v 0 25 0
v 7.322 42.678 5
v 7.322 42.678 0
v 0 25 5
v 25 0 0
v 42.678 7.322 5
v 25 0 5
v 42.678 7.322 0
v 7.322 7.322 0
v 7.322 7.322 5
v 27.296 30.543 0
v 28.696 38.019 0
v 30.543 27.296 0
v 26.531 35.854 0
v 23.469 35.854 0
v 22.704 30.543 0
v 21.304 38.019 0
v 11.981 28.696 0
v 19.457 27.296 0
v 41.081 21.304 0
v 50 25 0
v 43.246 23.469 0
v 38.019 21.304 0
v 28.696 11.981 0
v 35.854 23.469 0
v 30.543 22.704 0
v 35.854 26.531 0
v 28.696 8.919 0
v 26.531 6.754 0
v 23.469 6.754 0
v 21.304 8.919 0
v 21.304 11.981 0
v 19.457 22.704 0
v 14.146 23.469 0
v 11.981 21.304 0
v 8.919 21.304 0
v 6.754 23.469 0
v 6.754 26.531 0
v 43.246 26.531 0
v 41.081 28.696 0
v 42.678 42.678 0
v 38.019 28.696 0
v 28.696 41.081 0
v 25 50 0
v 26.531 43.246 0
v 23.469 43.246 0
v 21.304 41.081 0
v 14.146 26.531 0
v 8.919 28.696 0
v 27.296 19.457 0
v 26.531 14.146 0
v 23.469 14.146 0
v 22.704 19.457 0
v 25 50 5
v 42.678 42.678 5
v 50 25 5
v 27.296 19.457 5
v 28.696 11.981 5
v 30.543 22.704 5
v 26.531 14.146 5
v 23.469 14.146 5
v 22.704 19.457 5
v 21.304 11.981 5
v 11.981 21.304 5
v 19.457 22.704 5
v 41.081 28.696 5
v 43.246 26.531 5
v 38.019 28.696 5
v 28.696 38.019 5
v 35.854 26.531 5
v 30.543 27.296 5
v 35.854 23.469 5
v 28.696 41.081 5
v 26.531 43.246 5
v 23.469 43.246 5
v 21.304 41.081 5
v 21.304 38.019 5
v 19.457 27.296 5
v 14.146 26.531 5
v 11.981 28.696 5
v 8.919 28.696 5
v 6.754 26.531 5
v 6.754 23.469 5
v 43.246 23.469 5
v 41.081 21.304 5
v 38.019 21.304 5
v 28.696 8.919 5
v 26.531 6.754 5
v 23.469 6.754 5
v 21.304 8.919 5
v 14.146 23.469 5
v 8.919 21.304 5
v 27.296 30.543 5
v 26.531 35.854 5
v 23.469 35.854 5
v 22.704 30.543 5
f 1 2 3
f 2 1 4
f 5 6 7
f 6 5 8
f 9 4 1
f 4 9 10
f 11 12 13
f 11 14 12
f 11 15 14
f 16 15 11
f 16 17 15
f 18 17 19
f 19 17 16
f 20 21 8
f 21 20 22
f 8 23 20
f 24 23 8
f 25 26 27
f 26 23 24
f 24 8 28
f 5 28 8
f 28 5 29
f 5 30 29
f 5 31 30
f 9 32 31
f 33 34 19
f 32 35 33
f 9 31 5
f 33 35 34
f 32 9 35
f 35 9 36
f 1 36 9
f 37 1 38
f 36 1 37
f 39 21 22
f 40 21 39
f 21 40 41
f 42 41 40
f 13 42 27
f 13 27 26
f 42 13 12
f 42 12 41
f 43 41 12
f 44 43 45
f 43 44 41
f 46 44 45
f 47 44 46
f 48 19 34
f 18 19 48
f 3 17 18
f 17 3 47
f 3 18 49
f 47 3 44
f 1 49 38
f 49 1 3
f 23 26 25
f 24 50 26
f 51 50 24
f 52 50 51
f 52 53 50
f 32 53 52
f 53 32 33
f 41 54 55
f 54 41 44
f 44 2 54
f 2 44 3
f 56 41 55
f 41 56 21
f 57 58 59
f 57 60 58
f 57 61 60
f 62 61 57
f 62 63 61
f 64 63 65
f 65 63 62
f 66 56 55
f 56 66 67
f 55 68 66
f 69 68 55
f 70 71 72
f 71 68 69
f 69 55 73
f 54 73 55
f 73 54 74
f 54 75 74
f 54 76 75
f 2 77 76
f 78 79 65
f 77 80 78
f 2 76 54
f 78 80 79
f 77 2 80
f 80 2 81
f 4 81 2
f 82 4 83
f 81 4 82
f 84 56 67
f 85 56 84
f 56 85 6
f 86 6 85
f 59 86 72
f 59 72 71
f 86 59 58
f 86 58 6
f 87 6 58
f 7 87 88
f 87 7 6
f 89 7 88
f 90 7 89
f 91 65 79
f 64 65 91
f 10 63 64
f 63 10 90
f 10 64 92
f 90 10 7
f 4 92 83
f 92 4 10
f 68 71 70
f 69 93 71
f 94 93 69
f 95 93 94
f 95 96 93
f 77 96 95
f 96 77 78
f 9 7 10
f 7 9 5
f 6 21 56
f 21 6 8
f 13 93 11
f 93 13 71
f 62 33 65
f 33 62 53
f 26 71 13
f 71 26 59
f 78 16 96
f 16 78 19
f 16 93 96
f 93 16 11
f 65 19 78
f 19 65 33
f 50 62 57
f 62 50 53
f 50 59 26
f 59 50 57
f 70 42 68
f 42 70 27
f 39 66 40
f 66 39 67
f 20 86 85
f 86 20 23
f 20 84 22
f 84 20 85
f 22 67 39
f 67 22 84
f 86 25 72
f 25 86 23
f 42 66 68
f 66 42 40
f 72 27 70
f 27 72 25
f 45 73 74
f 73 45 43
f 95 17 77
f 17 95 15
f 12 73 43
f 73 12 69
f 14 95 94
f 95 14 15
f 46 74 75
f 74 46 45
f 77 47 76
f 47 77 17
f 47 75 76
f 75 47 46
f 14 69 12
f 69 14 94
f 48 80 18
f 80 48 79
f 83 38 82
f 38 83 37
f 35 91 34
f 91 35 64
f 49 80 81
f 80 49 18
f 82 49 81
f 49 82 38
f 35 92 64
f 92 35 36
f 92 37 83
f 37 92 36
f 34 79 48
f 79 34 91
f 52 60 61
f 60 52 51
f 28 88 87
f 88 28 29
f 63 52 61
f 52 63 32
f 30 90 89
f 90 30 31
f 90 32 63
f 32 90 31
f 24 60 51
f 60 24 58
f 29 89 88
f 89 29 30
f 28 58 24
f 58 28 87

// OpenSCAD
$fn = 32;

// ----------------------------------------------------------------------
// Polygon plate: 8-gon R25, 4 bolt windows
// ----------------------------------------------------------------------

// --- parameters (mm) ---
sides = 8;                // number of polygon sides
plate_r = 25;             // circumscribed radius of the polygon
bore_r = 6;               // centre bore radius
bolts = 4;                // number of bolt windows
ring_r = 14.55;           // bolt-circle radius
bolt_r = 4;               // bolt window radius
plate_t = 5;              // plate thickness, Z (extrusion height)
fit_tol = 0.05;           // declared fit tolerance (prompt contract)
free_tol = 0.2;           // declared free tolerance (prompt contract)

plate_d = 2 * plate_r;  // circumscribed diameter
bore_d = 2 * bore_r;  // centre bore diameter
bolt_d = 2 * bolt_r;  // bolt window diameter
ring_d = 2 * ring_r;  // bolt-circle diameter

profile = [[50, 25], [42.678, 42.678], [25, 50], [7.322, 42.678], [0, 25], [7.322, 7.322], [25, 0], [42.678, 7.322]];  // primary outline, 8 points, counter clockwise
void_1 = [[30.543, 27.296], [27.296, 30.543], [22.704, 30.543], [19.457, 27.296], [19.457, 22.704], [22.704, 19.457], [27.296, 19.457], [30.543, 22.704]];  // centre bore, 8 points
void_2 = [[43.246, 26.531], [41.081, 28.696], [38.019, 28.696], [35.854, 26.531], [35.854, 23.469], [38.019, 21.304], [41.081, 21.304], [43.246, 23.469]];  // bolt window 1, 8 points
void_3 = [[28.696, 41.081], [26.531, 43.246], [23.469, 43.246], [21.304, 41.081], [21.304, 38.019], [23.469, 35.854], [26.531, 35.854], [28.696, 38.019]];  // bolt window 2, 8 points
void_4 = [[14.146, 26.531], [11.981, 28.696], [8.919, 28.696], [6.754, 26.531], [6.754, 23.469], [8.919, 21.304], [11.981, 21.304], [14.146, 23.469]];  // bolt window 3, 8 points
void_5 = [[28.696, 11.981], [26.531, 14.146], [23.469, 14.146], [21.304, 11.981], [21.304, 8.919], [23.469, 6.754], [26.531, 6.754], [28.696, 8.919]];  // bolt window 4, 8 points

// --- the one profile operation ---
difference() {
  linear_extrude(height = plate_t) polygon(points = profile);
  translate([0, 0, -1])
    linear_extrude(height = plate_t + 2) polygon(points = void_1);
  translate([0, 0, -1])
    linear_extrude(height = plate_t + 2) polygon(points = void_2);
  translate([0, 0, -1])
    linear_extrude(height = plate_t + 2) polygon(points = void_3);
  translate([0, 0, -1])
    linear_extrude(height = plate_t + 2) polygon(points = void_4);
  translate([0, 0, -1])
    linear_extrude(height = plate_t + 2) polygon(points = void_5);
}
